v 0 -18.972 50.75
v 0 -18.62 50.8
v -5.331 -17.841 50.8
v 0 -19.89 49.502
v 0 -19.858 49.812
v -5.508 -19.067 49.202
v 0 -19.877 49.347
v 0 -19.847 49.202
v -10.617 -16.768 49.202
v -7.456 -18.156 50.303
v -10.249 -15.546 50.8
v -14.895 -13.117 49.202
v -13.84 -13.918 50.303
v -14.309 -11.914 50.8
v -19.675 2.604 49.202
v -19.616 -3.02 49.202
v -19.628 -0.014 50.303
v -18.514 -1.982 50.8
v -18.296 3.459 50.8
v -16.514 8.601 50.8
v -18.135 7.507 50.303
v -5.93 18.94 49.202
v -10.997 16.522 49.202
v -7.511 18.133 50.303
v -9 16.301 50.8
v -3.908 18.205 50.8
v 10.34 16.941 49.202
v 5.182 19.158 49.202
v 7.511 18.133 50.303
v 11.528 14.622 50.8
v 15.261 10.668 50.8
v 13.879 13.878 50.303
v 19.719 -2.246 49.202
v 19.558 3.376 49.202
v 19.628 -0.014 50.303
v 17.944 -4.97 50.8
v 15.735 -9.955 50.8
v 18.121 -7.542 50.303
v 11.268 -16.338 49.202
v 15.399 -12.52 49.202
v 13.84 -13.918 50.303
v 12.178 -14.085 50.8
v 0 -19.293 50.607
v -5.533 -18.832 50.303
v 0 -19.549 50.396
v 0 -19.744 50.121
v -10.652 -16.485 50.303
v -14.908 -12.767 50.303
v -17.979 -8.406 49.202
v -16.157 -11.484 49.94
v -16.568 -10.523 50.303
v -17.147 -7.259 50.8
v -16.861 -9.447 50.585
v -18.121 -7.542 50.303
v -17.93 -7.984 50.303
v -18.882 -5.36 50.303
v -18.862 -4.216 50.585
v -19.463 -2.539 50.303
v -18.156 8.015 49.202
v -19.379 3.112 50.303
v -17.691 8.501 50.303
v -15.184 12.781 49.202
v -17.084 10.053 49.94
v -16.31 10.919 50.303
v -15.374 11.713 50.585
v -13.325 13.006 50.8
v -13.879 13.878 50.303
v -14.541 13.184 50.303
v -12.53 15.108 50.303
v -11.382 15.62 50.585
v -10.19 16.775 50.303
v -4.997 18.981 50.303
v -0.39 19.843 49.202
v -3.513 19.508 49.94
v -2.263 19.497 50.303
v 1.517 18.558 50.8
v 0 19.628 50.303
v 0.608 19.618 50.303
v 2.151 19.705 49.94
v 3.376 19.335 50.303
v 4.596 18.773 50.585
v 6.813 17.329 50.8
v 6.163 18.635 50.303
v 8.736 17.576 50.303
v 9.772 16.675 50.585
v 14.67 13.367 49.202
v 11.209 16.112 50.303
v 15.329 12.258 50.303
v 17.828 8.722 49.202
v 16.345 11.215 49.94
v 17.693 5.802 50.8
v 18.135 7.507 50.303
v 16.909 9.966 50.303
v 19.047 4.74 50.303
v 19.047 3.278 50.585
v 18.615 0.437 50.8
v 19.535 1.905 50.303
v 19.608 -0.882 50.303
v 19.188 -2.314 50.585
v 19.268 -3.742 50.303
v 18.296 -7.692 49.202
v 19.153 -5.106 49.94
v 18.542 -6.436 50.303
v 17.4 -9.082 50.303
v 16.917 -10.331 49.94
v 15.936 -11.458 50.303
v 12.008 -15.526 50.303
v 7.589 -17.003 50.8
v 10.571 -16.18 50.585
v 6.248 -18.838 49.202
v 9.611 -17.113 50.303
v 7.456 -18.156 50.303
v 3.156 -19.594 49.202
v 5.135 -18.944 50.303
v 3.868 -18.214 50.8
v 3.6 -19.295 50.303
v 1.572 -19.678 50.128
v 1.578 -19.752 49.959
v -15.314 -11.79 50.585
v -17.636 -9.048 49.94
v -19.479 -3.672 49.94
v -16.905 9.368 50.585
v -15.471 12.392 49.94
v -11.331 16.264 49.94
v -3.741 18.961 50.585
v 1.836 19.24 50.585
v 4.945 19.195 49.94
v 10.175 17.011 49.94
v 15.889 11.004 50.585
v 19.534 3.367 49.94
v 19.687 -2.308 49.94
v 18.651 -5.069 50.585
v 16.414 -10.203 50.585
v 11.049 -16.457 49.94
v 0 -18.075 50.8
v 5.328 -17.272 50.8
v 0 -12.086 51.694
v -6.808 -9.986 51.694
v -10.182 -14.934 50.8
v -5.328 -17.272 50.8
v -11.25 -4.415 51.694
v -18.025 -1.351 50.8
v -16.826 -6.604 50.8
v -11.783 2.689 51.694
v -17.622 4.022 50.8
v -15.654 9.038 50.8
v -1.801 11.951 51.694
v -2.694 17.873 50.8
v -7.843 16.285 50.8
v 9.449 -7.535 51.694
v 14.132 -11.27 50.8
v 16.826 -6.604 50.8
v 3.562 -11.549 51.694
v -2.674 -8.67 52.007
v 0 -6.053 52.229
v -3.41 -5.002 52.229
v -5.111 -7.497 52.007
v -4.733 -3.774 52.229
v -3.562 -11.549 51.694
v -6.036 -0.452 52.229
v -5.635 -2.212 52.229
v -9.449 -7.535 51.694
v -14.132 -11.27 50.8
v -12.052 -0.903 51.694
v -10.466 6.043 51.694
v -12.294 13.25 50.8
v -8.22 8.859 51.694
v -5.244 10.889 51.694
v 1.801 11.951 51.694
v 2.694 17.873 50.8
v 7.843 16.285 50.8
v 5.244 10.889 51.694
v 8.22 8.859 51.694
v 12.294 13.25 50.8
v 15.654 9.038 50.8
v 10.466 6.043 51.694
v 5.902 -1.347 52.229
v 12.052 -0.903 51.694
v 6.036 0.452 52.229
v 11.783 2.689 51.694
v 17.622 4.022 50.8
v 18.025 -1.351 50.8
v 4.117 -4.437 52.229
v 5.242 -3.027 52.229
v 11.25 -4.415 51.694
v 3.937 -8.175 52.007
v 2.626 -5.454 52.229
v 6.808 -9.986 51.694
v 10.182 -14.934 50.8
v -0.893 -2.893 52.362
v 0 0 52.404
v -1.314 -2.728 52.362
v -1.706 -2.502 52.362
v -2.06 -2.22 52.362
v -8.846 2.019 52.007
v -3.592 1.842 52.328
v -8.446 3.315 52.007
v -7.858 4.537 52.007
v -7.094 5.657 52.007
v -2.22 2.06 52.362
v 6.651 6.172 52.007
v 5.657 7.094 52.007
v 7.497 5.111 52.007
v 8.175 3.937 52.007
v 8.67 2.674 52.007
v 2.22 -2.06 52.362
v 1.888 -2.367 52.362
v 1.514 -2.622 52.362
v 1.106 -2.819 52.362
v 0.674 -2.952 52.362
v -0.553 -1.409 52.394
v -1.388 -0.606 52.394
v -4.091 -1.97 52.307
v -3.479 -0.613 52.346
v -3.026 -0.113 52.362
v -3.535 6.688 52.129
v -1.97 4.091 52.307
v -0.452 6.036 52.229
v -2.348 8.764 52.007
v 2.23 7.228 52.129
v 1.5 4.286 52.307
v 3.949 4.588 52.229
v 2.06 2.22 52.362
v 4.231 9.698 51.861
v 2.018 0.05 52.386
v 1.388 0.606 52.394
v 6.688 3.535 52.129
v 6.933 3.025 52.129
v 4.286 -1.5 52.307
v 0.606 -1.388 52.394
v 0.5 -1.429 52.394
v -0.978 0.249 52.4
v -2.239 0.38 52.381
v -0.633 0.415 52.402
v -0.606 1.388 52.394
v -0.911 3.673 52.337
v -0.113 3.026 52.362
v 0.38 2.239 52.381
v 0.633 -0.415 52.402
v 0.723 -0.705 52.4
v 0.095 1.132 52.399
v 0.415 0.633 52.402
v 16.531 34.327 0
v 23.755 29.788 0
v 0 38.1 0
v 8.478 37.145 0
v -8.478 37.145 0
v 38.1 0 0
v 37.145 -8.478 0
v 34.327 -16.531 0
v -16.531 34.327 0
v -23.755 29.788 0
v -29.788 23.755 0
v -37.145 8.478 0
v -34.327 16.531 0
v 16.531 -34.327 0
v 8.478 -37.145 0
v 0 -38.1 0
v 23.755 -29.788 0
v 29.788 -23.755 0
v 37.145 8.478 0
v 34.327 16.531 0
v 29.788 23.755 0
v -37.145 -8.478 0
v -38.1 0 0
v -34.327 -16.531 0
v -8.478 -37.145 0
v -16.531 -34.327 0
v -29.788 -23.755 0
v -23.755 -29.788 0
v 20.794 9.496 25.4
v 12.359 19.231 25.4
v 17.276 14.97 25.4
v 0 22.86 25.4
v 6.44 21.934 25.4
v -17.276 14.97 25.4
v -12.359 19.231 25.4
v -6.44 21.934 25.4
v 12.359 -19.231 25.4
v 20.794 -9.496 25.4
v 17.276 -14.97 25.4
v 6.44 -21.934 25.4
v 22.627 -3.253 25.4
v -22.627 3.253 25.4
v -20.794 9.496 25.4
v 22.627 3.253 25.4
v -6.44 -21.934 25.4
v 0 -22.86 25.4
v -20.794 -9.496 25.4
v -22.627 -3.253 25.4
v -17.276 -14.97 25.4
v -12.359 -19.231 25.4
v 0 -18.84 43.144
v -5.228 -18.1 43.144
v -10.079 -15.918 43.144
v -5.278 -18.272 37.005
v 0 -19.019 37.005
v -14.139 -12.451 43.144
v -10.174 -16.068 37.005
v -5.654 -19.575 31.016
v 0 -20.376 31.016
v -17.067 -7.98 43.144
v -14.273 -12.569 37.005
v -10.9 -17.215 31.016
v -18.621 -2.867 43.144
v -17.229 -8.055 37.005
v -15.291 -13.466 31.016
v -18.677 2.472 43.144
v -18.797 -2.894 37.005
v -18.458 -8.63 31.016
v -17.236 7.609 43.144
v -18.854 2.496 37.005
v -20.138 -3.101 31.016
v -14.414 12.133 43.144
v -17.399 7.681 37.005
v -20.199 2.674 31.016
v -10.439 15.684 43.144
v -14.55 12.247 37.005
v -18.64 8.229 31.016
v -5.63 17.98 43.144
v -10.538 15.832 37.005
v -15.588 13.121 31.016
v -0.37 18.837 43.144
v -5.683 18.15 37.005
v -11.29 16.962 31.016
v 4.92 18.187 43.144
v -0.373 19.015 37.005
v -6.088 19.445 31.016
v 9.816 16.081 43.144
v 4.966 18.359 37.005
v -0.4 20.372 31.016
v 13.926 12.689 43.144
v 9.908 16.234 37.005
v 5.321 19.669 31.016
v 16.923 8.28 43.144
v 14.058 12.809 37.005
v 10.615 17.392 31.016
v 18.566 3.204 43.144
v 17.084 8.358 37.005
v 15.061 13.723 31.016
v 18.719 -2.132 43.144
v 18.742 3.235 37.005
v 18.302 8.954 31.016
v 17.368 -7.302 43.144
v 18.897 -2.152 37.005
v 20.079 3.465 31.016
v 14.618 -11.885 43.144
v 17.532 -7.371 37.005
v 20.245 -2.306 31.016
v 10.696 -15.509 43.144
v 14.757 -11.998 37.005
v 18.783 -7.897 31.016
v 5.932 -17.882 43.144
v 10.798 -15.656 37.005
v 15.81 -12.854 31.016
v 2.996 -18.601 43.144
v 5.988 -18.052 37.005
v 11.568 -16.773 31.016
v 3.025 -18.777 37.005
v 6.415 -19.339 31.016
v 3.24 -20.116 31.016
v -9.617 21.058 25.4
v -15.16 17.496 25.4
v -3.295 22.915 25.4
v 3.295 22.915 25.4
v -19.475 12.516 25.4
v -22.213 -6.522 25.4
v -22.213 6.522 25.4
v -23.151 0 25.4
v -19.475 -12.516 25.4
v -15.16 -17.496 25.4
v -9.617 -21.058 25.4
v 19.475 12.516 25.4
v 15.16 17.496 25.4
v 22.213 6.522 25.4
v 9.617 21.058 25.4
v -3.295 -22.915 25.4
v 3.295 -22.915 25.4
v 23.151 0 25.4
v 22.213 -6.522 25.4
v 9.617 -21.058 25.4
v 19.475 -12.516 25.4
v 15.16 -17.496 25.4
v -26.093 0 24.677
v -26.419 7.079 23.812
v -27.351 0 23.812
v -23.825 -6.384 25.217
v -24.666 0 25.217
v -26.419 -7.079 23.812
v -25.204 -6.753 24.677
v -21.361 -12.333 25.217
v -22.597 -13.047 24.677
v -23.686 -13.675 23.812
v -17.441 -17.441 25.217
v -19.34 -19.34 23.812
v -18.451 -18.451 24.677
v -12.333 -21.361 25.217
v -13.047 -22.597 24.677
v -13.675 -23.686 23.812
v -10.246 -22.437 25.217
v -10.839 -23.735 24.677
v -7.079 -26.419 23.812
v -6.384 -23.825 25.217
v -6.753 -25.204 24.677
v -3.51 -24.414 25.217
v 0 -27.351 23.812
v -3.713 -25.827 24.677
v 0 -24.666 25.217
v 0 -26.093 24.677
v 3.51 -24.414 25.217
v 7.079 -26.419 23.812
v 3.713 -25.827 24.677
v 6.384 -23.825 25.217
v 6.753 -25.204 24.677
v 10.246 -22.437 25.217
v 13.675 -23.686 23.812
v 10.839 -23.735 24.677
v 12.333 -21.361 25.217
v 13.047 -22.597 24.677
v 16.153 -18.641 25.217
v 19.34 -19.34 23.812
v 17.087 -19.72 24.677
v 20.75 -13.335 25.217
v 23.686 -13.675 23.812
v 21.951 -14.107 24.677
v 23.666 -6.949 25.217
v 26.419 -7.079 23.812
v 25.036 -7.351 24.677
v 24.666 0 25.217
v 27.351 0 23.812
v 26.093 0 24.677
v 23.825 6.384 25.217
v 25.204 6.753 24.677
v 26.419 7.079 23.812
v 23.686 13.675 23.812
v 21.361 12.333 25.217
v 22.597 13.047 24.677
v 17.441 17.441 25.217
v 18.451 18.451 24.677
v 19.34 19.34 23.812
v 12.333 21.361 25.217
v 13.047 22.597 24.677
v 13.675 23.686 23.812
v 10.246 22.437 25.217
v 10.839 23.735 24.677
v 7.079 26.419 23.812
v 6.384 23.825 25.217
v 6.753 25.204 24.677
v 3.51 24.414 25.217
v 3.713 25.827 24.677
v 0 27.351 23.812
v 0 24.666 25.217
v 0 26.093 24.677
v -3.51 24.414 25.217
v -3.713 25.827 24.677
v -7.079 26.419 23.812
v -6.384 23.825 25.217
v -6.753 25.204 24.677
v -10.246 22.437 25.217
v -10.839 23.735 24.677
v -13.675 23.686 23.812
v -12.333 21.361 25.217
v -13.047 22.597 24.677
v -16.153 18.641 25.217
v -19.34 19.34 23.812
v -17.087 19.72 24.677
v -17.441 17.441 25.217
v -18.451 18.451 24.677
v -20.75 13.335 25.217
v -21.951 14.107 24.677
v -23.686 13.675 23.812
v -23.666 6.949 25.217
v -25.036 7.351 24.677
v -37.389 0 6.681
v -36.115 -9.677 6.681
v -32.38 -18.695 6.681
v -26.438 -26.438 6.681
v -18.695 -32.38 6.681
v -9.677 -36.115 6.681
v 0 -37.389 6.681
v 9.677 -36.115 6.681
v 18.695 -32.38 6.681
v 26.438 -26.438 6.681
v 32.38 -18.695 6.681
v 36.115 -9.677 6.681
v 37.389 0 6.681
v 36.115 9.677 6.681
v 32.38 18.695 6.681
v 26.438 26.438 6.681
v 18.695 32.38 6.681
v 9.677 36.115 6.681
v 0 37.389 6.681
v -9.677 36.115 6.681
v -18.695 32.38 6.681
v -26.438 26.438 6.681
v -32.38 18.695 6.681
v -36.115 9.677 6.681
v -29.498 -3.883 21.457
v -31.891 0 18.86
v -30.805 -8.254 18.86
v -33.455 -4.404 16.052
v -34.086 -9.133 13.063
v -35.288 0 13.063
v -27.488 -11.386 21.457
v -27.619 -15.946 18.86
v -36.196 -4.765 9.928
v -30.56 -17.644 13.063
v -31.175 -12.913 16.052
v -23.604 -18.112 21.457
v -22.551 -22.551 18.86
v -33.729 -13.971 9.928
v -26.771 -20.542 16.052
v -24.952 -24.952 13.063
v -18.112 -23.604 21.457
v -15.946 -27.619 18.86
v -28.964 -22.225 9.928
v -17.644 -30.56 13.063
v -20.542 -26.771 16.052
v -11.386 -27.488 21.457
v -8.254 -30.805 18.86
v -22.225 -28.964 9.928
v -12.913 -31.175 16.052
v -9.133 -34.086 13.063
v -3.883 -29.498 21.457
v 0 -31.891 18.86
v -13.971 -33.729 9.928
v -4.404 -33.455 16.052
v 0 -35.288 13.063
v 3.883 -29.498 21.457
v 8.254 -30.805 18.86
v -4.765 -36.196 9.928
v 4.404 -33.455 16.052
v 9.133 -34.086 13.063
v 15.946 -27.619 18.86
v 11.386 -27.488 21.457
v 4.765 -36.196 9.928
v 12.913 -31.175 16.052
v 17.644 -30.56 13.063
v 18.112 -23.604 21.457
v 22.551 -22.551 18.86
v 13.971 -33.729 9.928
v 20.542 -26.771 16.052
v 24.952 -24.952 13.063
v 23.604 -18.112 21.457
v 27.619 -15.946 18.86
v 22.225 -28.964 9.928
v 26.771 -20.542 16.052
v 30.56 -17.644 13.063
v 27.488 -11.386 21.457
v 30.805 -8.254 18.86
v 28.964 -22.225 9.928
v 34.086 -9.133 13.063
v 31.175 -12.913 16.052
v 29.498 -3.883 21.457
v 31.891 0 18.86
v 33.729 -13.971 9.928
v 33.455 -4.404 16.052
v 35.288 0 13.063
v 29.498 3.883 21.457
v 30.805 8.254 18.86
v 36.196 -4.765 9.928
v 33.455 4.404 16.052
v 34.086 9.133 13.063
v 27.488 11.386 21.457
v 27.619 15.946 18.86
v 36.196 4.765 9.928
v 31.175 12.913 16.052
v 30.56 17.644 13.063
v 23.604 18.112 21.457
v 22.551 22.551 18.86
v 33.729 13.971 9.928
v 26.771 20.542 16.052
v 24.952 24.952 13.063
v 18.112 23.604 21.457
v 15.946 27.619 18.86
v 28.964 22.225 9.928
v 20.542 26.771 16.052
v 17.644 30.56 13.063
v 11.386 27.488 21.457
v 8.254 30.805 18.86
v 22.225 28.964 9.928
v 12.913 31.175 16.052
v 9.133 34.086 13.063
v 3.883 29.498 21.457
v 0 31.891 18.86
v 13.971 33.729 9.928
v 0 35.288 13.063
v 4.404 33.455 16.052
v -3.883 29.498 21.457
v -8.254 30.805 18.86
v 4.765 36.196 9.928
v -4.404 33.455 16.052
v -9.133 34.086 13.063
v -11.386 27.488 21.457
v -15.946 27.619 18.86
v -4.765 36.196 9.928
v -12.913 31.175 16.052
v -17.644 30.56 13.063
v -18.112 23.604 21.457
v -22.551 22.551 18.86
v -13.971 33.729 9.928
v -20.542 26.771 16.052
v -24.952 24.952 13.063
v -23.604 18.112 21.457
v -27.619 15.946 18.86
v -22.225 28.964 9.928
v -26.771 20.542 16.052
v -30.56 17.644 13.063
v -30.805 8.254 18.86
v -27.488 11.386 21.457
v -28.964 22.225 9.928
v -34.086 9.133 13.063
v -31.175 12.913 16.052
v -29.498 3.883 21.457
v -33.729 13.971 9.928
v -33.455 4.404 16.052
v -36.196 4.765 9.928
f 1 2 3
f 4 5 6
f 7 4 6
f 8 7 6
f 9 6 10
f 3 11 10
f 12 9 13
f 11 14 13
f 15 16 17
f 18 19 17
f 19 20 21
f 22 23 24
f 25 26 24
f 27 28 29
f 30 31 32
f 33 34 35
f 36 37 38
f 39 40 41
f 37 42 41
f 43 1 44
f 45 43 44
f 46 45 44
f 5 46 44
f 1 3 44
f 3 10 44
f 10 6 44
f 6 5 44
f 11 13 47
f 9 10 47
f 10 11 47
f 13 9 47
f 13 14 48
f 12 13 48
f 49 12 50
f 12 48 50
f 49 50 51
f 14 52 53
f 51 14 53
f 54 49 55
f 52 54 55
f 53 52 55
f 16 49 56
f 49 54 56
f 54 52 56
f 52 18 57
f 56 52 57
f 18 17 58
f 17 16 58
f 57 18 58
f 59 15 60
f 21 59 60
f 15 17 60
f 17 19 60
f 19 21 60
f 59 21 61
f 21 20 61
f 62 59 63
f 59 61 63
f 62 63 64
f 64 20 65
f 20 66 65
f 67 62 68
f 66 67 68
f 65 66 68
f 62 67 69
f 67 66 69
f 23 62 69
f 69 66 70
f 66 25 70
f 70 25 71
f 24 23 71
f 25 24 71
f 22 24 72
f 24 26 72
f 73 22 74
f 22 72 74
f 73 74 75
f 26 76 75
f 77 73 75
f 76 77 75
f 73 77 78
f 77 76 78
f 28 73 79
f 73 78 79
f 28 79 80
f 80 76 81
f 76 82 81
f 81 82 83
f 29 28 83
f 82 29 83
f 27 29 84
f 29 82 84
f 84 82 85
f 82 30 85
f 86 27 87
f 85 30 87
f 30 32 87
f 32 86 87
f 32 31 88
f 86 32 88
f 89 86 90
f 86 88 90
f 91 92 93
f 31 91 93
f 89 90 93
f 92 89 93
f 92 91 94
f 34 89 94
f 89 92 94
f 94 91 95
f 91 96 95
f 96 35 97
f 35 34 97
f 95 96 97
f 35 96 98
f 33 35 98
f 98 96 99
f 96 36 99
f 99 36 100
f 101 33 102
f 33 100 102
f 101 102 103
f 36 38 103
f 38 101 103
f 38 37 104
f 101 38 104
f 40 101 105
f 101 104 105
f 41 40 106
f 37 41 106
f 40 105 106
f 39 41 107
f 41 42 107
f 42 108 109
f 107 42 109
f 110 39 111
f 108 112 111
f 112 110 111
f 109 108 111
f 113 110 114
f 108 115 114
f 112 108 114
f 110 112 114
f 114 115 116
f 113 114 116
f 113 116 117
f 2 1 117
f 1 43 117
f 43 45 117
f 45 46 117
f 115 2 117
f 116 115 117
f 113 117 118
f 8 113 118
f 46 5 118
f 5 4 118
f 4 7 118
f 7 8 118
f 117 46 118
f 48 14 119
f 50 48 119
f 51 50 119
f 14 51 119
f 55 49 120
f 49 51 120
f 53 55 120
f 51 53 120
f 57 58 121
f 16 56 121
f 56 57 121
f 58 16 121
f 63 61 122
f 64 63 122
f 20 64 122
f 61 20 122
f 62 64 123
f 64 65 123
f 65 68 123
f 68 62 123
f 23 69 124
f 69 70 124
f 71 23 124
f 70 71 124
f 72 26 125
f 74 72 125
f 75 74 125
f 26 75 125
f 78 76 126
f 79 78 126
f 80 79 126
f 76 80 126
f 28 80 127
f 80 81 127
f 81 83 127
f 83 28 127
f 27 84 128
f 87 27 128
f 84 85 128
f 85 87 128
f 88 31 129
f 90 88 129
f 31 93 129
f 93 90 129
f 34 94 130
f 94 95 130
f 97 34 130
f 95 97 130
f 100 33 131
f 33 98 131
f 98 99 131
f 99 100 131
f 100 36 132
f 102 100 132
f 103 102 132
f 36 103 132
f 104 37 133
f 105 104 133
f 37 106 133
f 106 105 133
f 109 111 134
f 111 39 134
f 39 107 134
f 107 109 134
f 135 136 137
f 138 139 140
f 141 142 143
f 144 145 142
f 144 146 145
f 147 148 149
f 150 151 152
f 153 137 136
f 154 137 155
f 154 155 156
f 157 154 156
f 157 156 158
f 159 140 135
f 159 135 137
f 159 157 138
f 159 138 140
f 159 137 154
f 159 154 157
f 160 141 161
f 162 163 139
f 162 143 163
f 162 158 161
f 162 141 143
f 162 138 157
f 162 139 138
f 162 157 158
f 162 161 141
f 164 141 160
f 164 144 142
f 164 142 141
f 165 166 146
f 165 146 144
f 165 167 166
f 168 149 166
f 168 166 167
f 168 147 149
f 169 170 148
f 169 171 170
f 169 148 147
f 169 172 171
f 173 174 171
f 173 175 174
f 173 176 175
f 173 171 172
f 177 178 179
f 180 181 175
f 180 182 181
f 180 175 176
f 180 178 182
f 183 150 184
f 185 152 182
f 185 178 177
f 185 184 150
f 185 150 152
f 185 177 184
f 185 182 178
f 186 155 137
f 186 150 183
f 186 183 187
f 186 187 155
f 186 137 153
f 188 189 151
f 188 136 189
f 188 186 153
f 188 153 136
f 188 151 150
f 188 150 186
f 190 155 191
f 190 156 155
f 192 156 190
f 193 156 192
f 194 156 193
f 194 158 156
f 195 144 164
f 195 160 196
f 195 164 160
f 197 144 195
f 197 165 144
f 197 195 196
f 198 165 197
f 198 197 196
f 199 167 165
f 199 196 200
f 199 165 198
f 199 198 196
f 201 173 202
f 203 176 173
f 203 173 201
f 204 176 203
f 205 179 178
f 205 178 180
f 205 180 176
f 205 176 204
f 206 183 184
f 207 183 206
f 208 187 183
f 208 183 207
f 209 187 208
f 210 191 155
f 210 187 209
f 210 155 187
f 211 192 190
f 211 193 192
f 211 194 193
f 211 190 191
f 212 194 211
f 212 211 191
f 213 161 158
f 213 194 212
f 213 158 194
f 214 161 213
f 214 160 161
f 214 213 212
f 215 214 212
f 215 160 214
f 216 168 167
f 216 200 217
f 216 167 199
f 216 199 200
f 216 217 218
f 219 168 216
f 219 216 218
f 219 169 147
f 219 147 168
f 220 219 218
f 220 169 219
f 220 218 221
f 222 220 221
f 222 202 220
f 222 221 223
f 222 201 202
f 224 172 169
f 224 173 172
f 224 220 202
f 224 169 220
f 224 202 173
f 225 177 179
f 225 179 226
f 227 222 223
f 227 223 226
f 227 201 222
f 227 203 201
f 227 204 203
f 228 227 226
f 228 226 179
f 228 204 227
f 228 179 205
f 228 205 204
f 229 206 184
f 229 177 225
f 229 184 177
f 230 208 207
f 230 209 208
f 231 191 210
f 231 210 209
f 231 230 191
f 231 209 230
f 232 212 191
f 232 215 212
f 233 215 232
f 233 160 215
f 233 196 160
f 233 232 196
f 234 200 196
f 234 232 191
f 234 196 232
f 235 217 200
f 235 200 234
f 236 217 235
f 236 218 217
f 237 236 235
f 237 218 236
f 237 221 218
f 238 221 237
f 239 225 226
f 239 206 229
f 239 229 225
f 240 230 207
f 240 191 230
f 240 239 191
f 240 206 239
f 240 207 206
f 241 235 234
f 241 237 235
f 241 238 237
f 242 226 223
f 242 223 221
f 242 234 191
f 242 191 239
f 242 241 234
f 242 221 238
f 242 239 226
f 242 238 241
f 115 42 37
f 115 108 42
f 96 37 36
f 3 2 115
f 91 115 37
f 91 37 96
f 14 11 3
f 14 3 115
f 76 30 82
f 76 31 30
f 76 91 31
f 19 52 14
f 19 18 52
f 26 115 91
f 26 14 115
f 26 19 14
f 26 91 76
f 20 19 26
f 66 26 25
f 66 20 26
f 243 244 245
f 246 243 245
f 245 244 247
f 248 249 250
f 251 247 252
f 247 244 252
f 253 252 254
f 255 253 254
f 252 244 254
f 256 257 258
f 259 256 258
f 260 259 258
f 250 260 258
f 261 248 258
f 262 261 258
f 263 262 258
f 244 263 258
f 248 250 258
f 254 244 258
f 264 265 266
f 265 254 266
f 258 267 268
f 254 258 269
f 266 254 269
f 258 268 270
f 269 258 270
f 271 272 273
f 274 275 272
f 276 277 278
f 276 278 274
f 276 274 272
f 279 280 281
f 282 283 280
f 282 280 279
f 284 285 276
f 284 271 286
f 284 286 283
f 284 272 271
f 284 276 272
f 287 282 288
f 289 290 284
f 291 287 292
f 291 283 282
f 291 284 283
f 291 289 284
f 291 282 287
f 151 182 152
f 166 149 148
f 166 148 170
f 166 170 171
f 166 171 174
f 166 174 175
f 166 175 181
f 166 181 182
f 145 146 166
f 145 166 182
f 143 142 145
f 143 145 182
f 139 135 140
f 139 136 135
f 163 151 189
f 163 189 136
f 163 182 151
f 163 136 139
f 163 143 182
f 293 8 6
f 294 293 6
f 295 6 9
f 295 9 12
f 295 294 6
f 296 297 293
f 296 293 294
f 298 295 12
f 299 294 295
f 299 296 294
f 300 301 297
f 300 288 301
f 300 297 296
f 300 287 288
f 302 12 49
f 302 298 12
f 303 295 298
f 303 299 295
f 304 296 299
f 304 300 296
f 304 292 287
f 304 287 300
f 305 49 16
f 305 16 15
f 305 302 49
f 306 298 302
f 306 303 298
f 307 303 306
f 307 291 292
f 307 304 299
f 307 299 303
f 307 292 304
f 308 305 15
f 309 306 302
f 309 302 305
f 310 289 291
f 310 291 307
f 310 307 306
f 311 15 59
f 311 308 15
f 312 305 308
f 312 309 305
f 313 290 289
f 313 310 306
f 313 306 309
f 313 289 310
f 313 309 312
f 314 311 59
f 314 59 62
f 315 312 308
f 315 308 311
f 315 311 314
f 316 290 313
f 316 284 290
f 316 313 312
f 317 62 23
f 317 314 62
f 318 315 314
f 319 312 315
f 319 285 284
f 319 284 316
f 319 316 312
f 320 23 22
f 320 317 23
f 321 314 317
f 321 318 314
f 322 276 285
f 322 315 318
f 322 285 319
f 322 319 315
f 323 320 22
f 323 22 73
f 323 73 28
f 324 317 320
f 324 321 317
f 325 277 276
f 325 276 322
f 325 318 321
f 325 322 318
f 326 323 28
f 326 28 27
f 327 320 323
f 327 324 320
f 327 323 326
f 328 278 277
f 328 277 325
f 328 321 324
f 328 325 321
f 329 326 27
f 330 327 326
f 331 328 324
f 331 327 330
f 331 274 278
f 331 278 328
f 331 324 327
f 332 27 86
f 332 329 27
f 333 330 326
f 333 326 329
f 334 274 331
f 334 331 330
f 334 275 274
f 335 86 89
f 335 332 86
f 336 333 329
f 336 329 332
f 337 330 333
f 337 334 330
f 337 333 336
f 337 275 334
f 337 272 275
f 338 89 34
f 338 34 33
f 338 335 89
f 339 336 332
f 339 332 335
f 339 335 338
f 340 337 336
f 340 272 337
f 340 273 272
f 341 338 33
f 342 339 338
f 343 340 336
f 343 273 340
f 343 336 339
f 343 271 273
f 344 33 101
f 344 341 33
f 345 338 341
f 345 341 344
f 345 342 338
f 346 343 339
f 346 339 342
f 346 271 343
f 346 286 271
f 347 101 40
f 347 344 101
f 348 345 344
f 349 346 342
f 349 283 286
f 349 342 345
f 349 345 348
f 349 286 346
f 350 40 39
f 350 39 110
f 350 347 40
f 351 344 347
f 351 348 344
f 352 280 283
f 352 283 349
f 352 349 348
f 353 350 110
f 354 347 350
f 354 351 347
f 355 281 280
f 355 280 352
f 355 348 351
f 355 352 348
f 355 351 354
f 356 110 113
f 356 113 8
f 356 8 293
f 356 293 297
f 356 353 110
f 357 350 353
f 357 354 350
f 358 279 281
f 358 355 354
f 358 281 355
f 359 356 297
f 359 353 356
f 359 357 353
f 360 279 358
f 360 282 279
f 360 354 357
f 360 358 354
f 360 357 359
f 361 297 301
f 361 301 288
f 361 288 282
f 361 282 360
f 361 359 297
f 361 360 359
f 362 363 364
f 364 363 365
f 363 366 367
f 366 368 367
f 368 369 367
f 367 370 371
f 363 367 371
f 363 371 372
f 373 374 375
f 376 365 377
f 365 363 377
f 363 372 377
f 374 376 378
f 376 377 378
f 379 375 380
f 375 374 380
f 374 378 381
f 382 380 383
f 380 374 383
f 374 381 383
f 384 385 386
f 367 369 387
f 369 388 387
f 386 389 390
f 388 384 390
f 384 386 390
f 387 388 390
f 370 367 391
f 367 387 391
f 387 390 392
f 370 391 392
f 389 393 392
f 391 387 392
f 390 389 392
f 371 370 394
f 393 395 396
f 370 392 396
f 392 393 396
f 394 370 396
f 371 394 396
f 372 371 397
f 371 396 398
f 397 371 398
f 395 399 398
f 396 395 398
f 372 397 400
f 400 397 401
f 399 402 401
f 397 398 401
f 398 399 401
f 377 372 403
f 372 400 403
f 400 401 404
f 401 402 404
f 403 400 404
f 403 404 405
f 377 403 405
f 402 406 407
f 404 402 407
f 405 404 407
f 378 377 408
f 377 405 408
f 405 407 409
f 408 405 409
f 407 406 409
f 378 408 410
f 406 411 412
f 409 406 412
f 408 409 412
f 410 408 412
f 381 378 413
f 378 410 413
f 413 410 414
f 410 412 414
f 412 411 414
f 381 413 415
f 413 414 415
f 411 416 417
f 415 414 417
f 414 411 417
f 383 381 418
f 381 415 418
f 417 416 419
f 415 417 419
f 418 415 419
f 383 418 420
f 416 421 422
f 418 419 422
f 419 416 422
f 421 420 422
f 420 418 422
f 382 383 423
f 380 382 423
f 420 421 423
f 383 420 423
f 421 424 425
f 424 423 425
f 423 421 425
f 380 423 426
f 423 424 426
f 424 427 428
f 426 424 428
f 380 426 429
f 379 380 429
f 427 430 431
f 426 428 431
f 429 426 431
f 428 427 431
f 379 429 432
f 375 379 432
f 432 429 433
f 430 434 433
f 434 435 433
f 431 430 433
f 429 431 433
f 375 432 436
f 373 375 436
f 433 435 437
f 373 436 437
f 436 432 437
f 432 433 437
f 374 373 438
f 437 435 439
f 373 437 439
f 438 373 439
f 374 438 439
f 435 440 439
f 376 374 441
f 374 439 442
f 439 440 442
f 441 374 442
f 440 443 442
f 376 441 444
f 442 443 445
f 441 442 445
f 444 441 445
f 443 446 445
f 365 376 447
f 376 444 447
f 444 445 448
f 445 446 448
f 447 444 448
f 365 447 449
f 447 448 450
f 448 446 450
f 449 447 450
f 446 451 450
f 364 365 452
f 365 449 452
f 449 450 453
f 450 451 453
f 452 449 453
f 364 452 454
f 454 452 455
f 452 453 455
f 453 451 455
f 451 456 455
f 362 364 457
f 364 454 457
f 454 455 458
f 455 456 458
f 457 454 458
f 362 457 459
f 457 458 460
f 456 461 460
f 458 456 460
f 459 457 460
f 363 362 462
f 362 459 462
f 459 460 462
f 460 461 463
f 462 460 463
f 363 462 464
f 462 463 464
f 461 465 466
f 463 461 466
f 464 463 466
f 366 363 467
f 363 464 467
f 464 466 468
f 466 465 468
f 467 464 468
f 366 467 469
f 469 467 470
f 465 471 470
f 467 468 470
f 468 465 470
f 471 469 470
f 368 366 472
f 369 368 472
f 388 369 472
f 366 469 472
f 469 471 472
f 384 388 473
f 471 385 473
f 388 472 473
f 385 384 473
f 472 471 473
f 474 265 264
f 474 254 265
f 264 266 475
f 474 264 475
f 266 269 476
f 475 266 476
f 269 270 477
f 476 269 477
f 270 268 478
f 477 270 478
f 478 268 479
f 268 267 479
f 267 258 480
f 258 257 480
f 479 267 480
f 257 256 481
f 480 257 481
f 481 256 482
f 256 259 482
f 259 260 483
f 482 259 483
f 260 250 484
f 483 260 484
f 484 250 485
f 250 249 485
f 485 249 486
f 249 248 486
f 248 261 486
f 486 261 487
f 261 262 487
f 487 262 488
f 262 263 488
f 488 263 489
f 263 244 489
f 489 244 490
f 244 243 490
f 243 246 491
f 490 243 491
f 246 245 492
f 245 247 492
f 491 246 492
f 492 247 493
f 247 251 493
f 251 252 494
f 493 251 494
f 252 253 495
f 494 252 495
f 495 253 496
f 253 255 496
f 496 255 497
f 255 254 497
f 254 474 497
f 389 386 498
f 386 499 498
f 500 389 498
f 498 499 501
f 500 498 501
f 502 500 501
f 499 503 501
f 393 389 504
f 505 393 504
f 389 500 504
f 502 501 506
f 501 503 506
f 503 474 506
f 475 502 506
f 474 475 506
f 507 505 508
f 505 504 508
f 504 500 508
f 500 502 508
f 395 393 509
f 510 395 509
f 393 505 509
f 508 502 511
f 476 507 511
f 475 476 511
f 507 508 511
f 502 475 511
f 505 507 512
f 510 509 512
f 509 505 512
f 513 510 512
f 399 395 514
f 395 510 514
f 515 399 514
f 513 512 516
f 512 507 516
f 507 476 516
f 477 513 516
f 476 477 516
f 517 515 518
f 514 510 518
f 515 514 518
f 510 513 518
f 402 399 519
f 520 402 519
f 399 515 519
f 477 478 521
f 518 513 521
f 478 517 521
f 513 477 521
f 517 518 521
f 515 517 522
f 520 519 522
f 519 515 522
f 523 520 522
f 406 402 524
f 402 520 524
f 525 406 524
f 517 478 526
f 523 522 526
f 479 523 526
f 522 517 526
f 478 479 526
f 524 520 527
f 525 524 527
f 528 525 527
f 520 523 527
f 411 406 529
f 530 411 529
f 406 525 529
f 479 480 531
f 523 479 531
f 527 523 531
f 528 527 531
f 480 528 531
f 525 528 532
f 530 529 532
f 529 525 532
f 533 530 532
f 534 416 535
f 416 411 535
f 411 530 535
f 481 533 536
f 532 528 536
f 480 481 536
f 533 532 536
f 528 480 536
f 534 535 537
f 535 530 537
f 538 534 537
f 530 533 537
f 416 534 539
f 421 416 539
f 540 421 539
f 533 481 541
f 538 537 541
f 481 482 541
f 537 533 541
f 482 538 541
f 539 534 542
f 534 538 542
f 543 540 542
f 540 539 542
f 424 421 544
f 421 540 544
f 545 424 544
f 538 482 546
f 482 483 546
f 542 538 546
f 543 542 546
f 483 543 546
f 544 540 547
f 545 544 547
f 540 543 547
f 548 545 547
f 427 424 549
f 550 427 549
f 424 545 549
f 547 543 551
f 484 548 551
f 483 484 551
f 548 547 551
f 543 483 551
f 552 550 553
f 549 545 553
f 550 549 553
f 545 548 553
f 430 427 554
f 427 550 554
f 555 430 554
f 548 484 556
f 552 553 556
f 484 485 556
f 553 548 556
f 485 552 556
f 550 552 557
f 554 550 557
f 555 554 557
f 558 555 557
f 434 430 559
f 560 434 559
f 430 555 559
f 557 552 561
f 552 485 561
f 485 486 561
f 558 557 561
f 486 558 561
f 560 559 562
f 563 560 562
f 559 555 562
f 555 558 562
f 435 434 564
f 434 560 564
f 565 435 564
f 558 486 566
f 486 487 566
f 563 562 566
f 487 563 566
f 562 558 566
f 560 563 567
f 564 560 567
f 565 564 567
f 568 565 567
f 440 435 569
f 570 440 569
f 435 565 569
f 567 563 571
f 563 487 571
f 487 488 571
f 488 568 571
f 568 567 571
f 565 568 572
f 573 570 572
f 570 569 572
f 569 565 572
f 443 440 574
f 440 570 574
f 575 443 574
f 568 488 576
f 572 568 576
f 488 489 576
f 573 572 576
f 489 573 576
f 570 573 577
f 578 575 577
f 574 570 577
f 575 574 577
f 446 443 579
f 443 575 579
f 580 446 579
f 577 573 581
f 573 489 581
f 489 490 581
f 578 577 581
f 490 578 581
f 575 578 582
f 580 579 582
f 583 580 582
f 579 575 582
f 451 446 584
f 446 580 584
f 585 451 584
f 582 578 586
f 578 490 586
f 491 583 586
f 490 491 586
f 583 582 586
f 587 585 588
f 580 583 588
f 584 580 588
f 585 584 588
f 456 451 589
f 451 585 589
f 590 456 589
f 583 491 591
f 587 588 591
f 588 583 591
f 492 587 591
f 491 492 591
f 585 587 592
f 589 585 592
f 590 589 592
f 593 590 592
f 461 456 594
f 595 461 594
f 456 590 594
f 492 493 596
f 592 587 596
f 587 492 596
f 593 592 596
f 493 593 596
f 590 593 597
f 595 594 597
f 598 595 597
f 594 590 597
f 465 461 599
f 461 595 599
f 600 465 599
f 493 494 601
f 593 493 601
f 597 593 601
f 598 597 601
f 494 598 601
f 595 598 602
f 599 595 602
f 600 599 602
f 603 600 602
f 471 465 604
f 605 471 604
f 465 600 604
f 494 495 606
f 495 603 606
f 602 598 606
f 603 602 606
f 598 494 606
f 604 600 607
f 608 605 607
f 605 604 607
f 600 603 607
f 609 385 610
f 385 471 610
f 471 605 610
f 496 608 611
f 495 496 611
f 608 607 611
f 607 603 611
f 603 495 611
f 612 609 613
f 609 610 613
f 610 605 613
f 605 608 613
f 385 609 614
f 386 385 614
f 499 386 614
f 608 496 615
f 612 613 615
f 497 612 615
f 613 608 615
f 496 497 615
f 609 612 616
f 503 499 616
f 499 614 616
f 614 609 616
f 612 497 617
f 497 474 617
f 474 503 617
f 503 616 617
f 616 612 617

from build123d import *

# Parameters (mm, degrees)
F4_R = 1.27


with BuildPart() as f1:
    # F0 (on Front) → F1 (revolve)
    with BuildSketch(Plane.XZ):
        with BuildLine():
            Line((0, 25.4), (-23.150521, 25.4))
            ThreePointArc((-23.150521, 25.4), (-25.395585, 24.989881), (-27.350651, 23.8125))
            ThreePointArc((-27.350651, 23.8125), (-35.288151, 13.063151), (-38.1, 0))
            Line((-38.1, 0), (0, 0))
            Line((0, 0), (0, 25.4))
        make_face()
    revolve(axis=Axis((0, 0, 12.7), (0, 0, 1)))


with BuildPart() as f3:
    # F2 (on Right) → F3 (revolve)
    with BuildSketch(Plane.YZ):
        with BuildLine():
            Line((-22.86, 25.4), (0, 25.4))
            Line((0, 25.4), (0, 50.8))
            Line((0, 50.8), (-20.32, 50.8))
            ThreePointArc((-20.32, 50.8), (-18.924921, 37.833492), (-22.86, 25.4))
        make_face()
    revolve(axis=Axis((0, 0, 38.1), (0, 0, -1)))

    # F4
    f4_edges = [f3.edges().sort_by_distance(p)[0] for p in [
        (0, 20.32, 50.8),
    ]]
    fillet(f4_edges, radius=F4_R)


with BuildPart() as f6:
    # F5 (on Right) → F6 (revolve)
    with BuildSketch(Plane.YZ):
        with BuildLine():
            ThreePointArc((0, 52.404309), (-9.073513, 52.006505), (-18.075247, 50.8))
            Line((-18.075247, 50.8), (0, 50.8))
            Line((0, 50.8), (0, 52.404309))
        make_face()
    revolve(axis=Axis((0, 0, 51.602155), (0, 0, -1)))


solid = Compound([f1.part, f3.part, f6.part])
